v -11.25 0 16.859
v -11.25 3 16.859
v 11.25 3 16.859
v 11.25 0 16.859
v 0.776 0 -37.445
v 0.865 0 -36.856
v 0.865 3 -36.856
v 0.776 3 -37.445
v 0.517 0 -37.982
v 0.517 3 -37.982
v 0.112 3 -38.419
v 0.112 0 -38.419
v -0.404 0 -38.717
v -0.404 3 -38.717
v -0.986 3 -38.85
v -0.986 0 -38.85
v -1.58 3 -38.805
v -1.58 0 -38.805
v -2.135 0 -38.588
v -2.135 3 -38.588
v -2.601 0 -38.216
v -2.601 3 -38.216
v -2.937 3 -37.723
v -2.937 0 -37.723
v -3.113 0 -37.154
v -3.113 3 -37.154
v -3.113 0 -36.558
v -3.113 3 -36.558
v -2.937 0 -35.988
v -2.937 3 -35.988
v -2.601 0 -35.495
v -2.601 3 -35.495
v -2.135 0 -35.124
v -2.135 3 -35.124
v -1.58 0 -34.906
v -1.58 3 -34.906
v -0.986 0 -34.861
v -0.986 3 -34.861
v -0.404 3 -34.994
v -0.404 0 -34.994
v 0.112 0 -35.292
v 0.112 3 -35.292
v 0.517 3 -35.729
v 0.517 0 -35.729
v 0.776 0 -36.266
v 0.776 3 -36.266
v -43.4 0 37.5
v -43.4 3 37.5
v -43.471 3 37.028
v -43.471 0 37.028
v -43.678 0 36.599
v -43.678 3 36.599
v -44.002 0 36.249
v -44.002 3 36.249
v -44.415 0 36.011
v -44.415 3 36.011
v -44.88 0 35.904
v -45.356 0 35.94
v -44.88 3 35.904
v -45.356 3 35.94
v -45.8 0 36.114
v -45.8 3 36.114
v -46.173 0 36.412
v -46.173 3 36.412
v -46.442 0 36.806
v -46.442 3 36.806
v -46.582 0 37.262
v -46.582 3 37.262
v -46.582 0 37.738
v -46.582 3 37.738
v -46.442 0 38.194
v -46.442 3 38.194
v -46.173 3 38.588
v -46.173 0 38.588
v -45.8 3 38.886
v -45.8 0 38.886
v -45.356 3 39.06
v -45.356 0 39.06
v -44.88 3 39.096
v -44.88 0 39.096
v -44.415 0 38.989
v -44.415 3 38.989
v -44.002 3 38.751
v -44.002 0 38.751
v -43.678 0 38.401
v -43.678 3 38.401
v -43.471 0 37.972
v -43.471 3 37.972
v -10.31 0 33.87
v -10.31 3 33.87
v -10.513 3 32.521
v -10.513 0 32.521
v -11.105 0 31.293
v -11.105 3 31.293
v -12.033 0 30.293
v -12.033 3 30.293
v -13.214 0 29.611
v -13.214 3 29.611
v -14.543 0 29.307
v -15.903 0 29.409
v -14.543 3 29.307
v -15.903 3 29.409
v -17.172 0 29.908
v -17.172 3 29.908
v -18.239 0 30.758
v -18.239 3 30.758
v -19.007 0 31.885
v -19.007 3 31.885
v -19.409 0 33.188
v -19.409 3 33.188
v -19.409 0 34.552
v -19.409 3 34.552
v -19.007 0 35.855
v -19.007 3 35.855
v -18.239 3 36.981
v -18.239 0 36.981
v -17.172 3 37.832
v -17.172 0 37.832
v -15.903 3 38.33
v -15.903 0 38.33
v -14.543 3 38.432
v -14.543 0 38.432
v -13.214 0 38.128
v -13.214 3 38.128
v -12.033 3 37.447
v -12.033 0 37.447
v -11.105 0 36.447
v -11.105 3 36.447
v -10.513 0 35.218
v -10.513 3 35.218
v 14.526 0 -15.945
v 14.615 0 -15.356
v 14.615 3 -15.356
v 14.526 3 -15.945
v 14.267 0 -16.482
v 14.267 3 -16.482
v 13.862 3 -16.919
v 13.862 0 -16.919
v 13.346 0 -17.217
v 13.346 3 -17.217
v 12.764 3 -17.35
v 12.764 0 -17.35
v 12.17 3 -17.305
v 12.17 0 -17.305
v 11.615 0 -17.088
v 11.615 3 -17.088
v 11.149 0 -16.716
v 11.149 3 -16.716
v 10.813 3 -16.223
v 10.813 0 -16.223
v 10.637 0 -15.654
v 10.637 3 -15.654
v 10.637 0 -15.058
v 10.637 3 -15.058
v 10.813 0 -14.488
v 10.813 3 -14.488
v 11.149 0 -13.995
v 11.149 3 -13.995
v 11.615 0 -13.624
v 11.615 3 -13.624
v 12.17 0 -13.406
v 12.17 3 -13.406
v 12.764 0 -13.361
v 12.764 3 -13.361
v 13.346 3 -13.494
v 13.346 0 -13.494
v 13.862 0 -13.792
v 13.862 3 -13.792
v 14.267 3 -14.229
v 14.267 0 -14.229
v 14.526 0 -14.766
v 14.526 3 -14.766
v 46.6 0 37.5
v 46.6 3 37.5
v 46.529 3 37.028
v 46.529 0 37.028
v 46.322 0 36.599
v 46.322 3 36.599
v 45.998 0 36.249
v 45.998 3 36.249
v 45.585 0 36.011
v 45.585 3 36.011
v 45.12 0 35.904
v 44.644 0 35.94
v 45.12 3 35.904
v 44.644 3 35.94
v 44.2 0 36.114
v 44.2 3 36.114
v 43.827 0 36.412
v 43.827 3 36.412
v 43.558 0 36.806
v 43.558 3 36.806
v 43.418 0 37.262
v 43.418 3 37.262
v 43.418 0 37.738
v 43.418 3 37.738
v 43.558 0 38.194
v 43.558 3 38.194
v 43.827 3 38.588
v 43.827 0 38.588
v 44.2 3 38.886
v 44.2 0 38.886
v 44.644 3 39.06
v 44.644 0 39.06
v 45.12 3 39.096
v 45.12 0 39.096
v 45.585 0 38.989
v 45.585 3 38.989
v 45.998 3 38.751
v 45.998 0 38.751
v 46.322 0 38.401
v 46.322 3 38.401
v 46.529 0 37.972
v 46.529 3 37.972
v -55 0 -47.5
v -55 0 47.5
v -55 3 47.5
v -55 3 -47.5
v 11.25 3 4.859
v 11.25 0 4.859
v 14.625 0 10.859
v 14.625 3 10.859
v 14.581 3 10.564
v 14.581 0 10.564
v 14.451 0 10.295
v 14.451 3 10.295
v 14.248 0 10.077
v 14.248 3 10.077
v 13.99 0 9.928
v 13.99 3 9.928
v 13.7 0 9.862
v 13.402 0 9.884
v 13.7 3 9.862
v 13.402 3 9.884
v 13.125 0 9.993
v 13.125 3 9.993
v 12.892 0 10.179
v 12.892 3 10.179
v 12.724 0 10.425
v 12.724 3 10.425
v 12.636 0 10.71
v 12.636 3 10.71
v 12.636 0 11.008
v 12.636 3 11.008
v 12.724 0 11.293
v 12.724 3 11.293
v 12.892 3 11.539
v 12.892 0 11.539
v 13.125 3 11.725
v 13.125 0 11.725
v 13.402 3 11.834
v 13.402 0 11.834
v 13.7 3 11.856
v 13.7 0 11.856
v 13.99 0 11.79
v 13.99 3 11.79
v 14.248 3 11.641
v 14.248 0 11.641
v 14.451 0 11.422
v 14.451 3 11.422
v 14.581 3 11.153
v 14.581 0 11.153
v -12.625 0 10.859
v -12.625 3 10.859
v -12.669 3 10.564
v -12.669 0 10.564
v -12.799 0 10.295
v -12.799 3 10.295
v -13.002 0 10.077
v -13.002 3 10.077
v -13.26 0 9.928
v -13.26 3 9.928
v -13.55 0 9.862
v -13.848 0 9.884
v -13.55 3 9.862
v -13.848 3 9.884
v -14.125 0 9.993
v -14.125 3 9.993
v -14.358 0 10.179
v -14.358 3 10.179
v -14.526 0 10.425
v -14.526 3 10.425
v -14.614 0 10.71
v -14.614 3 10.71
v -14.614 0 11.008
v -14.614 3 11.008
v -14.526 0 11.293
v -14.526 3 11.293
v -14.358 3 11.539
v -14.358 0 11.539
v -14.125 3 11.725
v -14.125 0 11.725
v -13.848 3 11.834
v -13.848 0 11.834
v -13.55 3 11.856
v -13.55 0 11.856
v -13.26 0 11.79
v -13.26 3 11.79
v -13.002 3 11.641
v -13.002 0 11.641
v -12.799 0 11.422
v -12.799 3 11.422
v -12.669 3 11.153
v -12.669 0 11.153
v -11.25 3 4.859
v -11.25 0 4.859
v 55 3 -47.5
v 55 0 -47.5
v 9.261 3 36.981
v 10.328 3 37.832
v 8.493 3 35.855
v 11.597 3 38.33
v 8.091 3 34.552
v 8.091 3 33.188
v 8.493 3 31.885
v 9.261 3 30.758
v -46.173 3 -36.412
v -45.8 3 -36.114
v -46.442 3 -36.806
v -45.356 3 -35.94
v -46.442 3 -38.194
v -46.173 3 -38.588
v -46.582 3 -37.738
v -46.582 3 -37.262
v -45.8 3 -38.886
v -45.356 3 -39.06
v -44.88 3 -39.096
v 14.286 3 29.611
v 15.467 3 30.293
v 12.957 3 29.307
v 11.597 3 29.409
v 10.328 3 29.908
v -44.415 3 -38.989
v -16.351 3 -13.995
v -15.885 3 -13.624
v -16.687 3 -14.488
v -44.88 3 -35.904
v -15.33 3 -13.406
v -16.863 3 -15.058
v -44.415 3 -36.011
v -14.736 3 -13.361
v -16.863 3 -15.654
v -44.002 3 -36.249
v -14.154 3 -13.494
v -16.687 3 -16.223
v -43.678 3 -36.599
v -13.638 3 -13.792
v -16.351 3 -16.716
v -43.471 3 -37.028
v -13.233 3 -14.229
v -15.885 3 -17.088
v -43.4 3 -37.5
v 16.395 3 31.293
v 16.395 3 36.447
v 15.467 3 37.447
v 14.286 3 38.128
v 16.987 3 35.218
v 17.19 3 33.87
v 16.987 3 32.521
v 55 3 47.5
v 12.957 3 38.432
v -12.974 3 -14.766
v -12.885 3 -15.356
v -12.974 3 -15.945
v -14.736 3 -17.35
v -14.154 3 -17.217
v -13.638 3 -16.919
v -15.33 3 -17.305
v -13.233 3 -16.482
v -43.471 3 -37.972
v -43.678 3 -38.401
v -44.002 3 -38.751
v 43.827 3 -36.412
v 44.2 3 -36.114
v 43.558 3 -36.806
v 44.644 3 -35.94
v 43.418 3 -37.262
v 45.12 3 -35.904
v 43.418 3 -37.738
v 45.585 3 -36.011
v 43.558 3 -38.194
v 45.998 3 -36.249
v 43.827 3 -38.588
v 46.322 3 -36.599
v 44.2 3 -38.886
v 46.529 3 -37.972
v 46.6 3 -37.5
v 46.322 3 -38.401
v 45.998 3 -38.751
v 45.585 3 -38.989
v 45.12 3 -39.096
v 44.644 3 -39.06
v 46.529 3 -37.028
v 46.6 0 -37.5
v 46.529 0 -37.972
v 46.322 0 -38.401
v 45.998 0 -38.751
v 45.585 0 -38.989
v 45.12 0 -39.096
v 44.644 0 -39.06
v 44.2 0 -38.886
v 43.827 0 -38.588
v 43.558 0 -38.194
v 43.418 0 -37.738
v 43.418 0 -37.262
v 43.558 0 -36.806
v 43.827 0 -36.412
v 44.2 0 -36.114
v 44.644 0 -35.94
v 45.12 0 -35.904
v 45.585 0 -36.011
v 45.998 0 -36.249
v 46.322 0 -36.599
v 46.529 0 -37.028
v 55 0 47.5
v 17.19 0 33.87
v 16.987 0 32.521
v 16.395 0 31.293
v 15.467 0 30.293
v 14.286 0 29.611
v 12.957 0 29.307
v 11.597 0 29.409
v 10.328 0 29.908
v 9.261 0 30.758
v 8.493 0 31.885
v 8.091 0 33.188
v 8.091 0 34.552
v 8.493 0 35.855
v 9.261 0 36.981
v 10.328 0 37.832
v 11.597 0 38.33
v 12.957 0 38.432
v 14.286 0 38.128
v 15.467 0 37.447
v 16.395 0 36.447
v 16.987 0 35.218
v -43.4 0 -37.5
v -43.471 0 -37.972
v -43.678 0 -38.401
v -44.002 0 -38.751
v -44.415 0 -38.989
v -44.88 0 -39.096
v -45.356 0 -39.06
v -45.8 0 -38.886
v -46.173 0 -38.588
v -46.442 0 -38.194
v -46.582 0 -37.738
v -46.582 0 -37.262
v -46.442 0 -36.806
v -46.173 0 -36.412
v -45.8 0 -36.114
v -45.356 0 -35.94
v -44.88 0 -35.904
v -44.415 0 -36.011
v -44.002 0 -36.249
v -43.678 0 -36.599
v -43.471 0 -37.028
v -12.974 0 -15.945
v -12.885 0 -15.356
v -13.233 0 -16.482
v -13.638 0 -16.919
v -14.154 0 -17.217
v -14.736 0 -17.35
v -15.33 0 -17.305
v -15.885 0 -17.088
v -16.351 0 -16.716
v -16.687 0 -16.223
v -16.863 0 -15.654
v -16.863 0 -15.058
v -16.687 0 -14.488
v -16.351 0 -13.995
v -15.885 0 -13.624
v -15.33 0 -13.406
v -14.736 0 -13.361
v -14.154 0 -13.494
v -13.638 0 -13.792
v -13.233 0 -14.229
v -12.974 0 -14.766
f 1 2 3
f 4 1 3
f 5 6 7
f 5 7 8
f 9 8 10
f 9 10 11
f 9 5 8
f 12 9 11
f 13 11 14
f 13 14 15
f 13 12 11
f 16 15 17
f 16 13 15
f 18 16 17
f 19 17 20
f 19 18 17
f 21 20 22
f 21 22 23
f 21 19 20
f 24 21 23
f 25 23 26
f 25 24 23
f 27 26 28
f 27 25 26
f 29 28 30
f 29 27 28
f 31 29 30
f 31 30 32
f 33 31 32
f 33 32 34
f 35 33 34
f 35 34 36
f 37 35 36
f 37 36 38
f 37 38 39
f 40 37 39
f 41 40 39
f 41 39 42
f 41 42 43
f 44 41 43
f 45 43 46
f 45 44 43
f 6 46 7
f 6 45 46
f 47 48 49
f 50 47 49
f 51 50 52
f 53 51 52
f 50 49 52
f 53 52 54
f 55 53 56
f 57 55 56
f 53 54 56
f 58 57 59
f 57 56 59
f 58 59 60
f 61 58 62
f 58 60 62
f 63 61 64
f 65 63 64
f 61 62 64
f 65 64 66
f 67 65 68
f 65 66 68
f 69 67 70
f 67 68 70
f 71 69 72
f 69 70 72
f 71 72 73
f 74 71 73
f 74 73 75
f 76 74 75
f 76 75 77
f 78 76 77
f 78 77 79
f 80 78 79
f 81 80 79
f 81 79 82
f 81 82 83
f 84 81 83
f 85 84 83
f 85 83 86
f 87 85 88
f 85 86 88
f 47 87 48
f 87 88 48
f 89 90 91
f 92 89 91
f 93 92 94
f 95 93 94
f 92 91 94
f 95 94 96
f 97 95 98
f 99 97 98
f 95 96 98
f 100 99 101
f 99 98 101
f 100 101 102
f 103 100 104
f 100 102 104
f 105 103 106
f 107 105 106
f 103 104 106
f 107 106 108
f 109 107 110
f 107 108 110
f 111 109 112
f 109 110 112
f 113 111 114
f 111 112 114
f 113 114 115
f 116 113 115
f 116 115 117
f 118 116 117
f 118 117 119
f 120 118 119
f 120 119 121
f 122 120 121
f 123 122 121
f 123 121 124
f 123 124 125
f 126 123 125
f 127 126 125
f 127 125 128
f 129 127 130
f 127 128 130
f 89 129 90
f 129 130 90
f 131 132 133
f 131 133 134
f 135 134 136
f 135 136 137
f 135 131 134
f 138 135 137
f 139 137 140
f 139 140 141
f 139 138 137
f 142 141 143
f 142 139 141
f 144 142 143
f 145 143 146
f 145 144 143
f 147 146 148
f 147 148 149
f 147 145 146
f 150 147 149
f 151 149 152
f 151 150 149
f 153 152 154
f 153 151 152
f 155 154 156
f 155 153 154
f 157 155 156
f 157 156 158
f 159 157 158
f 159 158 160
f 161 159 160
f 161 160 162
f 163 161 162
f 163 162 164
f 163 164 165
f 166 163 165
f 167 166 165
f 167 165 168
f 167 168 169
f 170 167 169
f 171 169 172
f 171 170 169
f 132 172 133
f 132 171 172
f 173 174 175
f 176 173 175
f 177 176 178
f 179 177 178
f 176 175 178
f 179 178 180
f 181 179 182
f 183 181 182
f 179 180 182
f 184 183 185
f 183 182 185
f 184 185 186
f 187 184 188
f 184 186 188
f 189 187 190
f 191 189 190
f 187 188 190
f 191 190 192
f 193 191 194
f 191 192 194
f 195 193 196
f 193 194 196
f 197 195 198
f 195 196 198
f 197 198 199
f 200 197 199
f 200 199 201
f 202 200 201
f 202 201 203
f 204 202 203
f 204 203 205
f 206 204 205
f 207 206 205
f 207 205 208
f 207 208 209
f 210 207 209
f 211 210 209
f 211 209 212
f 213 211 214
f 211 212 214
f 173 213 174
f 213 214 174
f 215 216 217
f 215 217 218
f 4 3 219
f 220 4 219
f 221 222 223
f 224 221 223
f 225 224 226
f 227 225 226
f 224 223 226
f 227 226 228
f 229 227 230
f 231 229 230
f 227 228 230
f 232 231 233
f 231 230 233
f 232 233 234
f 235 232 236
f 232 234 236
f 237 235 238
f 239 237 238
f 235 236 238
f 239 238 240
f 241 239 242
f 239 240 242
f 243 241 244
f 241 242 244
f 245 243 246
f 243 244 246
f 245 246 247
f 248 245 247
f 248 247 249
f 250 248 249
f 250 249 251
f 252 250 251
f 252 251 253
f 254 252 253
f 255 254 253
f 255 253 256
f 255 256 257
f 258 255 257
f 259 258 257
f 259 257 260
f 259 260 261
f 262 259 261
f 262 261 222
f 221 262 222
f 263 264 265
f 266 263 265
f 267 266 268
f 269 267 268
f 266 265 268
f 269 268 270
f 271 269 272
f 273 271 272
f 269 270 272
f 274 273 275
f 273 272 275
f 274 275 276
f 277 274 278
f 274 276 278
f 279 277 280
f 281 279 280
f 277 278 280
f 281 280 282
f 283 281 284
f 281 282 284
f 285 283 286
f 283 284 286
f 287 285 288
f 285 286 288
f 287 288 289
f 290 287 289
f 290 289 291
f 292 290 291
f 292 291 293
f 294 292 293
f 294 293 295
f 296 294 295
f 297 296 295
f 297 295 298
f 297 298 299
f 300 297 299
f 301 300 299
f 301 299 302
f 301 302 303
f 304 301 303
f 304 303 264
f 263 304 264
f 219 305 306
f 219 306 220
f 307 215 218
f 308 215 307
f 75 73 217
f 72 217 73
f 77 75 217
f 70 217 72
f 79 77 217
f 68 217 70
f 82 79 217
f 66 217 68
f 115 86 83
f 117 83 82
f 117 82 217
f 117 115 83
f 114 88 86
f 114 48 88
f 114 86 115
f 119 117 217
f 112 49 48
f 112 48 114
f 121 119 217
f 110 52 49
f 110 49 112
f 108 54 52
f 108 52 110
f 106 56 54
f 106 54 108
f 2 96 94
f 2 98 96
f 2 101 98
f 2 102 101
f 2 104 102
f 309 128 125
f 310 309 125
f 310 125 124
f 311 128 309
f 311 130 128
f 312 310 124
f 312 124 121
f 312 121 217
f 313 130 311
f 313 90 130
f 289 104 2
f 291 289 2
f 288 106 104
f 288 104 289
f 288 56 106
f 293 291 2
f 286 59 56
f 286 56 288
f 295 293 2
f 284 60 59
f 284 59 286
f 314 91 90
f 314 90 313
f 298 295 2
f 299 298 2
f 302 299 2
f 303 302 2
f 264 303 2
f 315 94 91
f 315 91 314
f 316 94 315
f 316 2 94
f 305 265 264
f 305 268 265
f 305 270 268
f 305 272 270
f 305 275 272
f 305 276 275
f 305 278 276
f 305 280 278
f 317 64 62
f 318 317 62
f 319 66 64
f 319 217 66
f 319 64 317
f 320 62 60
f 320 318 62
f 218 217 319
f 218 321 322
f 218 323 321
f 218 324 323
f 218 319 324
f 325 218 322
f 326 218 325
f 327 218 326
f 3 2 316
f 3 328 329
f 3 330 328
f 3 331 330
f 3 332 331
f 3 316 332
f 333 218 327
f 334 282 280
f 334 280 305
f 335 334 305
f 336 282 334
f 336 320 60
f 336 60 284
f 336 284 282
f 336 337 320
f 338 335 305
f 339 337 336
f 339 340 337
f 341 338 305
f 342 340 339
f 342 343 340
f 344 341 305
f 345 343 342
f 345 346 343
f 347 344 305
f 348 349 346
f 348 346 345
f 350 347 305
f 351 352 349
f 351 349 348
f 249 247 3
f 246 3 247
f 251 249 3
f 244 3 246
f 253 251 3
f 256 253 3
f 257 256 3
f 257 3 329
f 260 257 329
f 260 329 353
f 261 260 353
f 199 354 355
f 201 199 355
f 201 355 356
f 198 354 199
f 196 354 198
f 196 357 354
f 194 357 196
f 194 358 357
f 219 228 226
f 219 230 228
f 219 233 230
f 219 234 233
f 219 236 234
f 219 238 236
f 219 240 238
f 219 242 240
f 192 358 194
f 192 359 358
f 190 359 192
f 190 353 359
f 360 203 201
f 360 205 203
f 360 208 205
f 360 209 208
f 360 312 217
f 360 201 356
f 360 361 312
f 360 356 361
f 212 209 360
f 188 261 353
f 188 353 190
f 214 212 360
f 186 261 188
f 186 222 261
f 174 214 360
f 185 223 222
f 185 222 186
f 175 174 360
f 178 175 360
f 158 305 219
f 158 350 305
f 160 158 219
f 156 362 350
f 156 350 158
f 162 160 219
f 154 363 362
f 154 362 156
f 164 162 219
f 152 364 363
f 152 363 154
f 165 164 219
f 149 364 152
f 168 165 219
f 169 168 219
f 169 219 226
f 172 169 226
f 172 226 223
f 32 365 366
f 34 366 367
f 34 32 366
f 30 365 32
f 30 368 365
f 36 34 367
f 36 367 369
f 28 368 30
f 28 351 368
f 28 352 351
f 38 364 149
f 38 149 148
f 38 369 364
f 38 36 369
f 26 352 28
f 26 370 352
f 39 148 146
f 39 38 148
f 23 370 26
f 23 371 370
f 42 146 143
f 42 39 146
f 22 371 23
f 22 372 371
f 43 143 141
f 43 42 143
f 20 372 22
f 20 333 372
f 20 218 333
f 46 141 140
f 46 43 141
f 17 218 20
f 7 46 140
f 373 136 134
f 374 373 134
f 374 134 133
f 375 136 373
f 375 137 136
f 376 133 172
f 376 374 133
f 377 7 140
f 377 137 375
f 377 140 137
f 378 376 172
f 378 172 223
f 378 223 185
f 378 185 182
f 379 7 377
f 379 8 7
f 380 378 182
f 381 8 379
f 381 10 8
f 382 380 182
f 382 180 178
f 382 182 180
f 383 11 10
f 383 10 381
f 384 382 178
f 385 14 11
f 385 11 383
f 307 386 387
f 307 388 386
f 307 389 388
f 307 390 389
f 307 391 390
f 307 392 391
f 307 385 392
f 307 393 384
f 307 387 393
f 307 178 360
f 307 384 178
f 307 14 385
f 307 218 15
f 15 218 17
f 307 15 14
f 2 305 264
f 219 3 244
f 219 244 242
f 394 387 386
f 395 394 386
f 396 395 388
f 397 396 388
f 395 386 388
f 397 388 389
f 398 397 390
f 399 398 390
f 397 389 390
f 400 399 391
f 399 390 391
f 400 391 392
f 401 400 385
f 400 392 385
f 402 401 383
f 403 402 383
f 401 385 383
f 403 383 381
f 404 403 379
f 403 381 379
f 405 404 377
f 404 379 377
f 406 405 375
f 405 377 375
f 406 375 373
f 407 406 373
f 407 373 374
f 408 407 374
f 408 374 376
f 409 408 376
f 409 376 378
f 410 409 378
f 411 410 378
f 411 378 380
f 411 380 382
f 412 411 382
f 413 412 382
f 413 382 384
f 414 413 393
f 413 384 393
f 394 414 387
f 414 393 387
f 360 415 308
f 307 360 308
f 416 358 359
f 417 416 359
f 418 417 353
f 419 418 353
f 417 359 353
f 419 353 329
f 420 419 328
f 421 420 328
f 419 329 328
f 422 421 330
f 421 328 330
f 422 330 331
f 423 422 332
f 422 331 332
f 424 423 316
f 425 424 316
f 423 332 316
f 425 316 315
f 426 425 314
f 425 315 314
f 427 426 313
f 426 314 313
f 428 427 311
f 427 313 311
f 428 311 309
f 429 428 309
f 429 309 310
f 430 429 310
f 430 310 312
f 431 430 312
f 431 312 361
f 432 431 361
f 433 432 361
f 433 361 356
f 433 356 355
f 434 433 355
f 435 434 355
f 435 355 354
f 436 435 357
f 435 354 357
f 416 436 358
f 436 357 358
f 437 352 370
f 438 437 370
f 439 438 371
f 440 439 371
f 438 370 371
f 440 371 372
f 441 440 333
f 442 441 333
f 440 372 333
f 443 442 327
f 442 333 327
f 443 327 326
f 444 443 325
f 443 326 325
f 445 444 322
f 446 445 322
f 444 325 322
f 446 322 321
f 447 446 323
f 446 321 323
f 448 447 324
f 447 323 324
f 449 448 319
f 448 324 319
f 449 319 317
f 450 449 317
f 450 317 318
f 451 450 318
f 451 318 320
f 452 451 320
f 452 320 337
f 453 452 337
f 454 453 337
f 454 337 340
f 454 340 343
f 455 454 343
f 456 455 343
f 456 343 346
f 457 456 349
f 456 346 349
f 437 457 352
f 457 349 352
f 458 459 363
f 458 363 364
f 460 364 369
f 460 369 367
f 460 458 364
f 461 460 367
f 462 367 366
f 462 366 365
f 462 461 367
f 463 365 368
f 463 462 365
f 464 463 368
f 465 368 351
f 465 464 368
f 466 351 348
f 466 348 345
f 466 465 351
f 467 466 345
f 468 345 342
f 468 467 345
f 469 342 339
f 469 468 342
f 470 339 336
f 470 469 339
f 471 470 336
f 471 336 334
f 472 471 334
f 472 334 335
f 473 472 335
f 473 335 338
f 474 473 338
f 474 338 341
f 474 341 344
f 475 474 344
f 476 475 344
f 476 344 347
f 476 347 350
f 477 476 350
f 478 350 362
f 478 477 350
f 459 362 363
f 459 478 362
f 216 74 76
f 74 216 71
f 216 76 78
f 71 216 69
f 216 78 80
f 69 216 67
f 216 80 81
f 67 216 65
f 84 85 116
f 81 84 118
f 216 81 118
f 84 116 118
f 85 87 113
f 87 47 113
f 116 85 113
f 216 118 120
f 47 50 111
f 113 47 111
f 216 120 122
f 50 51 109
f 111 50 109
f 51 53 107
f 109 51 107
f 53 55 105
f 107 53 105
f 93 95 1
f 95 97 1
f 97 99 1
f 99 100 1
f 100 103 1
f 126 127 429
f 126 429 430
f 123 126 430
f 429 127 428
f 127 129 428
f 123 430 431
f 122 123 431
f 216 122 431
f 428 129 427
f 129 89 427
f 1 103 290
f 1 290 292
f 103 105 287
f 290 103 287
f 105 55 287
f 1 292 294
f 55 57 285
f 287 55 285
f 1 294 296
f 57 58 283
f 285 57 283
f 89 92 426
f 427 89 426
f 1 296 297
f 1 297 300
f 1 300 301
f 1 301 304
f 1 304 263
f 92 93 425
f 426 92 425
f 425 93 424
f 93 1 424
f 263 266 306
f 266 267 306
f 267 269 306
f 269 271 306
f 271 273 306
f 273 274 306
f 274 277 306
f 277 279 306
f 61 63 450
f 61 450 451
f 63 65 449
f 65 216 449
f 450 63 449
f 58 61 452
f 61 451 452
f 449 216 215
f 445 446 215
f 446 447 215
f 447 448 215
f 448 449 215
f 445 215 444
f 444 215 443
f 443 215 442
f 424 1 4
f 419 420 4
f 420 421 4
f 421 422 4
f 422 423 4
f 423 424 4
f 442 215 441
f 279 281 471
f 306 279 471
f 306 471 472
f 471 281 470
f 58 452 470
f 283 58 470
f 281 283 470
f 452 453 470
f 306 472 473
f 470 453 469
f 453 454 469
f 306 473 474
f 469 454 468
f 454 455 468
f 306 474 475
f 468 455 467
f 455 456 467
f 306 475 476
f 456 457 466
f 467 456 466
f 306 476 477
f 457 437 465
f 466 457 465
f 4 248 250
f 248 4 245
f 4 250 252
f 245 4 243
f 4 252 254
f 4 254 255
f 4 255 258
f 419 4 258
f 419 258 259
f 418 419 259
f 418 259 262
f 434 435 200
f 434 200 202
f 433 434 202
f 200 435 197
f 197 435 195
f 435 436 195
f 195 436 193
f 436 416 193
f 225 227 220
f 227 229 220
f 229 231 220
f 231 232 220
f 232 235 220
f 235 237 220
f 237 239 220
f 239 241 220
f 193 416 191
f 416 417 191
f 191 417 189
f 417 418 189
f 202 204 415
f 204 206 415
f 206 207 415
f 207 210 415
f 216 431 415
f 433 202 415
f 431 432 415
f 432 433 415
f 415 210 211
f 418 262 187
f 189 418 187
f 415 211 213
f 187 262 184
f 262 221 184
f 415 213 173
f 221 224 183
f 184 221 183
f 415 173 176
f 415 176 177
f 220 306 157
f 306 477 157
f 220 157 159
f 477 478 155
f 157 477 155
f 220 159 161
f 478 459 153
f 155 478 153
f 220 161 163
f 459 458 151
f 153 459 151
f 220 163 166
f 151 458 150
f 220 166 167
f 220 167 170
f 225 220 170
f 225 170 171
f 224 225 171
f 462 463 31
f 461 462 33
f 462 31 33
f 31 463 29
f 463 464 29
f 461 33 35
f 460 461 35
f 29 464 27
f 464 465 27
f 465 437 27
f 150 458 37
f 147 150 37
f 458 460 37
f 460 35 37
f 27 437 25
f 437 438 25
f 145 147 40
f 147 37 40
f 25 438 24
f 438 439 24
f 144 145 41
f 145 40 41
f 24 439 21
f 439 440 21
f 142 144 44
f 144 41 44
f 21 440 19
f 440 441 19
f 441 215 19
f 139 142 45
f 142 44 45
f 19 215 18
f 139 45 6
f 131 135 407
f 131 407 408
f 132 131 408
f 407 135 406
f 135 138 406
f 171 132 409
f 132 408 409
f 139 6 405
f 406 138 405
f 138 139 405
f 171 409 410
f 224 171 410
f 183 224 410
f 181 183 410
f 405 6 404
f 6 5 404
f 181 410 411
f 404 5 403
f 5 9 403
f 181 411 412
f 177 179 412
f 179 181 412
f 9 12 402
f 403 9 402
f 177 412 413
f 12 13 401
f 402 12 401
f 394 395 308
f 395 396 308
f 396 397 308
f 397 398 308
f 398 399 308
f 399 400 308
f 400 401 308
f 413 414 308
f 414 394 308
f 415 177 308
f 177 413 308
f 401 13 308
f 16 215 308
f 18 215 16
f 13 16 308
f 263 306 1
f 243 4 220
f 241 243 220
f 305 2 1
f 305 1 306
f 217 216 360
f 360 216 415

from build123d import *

# Parameters (mm, degrees)
SKETCH1_W           = 110
SKETCH1_H           = 95
SKETCH1_R           = 2
BOSS_EXTRUDE1_DEPTH = 3
SKETCH2_R           = 1.6
CUT_EXTRUDE1_DEPTH  = 3
SKETCH4_R           = 4.575
CUT_EXTRUDE3_DEPTH  = 3
SKETCH5_R           = 1
SKETCH5_W           = 22.5
SKETCH5_H           = 12
CUT_EXTRUDE4_DEPTH  = 10


with BuildPart() as part:
    # Sketch1 → Boss-Extrude1 (new body)
    with BuildSketch(Plane(origin=(0, 0, 0), x_dir=(1, 0, 0), z_dir=(0, 1, 0))):
        Rectangle(SKETCH1_W, SKETCH1_H)
        with Locations((-1.134990048, 36.85560657)):
            Circle(SKETCH1_R, mode=Mode.SUBTRACT)
        with Locations((-14.884990048, 15.35560657)):
            Circle(SKETCH1_R, mode=Mode.SUBTRACT)
        with Locations((12.615009952, 15.35560657)):
            Circle(SKETCH1_R, mode=Mode.SUBTRACT)
    extrude(amount=BOSS_EXTRUDE1_DEPTH)

    # Sketch2 → Cut-Extrude1 (cut)
    with BuildSketch(Plane(origin=(0, 3, 0), x_dir=(1, 0, 0), z_dir=(0, 1, 0))):
        with Locations((-45, 37.5)):
            Circle(SKETCH2_R)
        with Locations((45, 37.5)):
            Circle(SKETCH2_R)
        with Locations((-45, -37.5)):
            Circle(SKETCH2_R)
        with Locations((45, -37.5)):
            Circle(SKETCH2_R)
    extrude(amount=-CUT_EXTRUDE1_DEPTH, mode=Mode.SUBTRACT)

    # Sketch4 → Cut-Extrude3 (cut)
    with BuildSketch(Plane(origin=(0, 3, 0), x_dir=(1, 0, 0), z_dir=(0, 1, 0))):
        with Locations((-14.884990048, -33.869690938)):
            Circle(SKETCH4_R)
        with Locations((12.615009952, -33.869690938)):
            Circle(SKETCH4_R)
    extrude(amount=-CUT_EXTRUDE3_DEPTH, mode=Mode.SUBTRACT)

    # Sketch5 → Cut-Extrude4 (cut)
    with BuildSketch(Plane(origin=(0, 3, 0), x_dir=(1, 0, 0), z_dir=(0, 1, 0))):
        with Locations((-13.625, -10.858715864)):
            Circle(SKETCH5_R)
        with Locations((13.625, -10.858715864)):
            Circle(SKETCH5_R)
        with Locations((0, -10.858715864)):
            Rectangle(SKETCH5_W, SKETCH5_H)
    extrude(amount=-CUT_EXTRUDE4_DEPTH, mode=Mode.SUBTRACT)


solid = part.part
